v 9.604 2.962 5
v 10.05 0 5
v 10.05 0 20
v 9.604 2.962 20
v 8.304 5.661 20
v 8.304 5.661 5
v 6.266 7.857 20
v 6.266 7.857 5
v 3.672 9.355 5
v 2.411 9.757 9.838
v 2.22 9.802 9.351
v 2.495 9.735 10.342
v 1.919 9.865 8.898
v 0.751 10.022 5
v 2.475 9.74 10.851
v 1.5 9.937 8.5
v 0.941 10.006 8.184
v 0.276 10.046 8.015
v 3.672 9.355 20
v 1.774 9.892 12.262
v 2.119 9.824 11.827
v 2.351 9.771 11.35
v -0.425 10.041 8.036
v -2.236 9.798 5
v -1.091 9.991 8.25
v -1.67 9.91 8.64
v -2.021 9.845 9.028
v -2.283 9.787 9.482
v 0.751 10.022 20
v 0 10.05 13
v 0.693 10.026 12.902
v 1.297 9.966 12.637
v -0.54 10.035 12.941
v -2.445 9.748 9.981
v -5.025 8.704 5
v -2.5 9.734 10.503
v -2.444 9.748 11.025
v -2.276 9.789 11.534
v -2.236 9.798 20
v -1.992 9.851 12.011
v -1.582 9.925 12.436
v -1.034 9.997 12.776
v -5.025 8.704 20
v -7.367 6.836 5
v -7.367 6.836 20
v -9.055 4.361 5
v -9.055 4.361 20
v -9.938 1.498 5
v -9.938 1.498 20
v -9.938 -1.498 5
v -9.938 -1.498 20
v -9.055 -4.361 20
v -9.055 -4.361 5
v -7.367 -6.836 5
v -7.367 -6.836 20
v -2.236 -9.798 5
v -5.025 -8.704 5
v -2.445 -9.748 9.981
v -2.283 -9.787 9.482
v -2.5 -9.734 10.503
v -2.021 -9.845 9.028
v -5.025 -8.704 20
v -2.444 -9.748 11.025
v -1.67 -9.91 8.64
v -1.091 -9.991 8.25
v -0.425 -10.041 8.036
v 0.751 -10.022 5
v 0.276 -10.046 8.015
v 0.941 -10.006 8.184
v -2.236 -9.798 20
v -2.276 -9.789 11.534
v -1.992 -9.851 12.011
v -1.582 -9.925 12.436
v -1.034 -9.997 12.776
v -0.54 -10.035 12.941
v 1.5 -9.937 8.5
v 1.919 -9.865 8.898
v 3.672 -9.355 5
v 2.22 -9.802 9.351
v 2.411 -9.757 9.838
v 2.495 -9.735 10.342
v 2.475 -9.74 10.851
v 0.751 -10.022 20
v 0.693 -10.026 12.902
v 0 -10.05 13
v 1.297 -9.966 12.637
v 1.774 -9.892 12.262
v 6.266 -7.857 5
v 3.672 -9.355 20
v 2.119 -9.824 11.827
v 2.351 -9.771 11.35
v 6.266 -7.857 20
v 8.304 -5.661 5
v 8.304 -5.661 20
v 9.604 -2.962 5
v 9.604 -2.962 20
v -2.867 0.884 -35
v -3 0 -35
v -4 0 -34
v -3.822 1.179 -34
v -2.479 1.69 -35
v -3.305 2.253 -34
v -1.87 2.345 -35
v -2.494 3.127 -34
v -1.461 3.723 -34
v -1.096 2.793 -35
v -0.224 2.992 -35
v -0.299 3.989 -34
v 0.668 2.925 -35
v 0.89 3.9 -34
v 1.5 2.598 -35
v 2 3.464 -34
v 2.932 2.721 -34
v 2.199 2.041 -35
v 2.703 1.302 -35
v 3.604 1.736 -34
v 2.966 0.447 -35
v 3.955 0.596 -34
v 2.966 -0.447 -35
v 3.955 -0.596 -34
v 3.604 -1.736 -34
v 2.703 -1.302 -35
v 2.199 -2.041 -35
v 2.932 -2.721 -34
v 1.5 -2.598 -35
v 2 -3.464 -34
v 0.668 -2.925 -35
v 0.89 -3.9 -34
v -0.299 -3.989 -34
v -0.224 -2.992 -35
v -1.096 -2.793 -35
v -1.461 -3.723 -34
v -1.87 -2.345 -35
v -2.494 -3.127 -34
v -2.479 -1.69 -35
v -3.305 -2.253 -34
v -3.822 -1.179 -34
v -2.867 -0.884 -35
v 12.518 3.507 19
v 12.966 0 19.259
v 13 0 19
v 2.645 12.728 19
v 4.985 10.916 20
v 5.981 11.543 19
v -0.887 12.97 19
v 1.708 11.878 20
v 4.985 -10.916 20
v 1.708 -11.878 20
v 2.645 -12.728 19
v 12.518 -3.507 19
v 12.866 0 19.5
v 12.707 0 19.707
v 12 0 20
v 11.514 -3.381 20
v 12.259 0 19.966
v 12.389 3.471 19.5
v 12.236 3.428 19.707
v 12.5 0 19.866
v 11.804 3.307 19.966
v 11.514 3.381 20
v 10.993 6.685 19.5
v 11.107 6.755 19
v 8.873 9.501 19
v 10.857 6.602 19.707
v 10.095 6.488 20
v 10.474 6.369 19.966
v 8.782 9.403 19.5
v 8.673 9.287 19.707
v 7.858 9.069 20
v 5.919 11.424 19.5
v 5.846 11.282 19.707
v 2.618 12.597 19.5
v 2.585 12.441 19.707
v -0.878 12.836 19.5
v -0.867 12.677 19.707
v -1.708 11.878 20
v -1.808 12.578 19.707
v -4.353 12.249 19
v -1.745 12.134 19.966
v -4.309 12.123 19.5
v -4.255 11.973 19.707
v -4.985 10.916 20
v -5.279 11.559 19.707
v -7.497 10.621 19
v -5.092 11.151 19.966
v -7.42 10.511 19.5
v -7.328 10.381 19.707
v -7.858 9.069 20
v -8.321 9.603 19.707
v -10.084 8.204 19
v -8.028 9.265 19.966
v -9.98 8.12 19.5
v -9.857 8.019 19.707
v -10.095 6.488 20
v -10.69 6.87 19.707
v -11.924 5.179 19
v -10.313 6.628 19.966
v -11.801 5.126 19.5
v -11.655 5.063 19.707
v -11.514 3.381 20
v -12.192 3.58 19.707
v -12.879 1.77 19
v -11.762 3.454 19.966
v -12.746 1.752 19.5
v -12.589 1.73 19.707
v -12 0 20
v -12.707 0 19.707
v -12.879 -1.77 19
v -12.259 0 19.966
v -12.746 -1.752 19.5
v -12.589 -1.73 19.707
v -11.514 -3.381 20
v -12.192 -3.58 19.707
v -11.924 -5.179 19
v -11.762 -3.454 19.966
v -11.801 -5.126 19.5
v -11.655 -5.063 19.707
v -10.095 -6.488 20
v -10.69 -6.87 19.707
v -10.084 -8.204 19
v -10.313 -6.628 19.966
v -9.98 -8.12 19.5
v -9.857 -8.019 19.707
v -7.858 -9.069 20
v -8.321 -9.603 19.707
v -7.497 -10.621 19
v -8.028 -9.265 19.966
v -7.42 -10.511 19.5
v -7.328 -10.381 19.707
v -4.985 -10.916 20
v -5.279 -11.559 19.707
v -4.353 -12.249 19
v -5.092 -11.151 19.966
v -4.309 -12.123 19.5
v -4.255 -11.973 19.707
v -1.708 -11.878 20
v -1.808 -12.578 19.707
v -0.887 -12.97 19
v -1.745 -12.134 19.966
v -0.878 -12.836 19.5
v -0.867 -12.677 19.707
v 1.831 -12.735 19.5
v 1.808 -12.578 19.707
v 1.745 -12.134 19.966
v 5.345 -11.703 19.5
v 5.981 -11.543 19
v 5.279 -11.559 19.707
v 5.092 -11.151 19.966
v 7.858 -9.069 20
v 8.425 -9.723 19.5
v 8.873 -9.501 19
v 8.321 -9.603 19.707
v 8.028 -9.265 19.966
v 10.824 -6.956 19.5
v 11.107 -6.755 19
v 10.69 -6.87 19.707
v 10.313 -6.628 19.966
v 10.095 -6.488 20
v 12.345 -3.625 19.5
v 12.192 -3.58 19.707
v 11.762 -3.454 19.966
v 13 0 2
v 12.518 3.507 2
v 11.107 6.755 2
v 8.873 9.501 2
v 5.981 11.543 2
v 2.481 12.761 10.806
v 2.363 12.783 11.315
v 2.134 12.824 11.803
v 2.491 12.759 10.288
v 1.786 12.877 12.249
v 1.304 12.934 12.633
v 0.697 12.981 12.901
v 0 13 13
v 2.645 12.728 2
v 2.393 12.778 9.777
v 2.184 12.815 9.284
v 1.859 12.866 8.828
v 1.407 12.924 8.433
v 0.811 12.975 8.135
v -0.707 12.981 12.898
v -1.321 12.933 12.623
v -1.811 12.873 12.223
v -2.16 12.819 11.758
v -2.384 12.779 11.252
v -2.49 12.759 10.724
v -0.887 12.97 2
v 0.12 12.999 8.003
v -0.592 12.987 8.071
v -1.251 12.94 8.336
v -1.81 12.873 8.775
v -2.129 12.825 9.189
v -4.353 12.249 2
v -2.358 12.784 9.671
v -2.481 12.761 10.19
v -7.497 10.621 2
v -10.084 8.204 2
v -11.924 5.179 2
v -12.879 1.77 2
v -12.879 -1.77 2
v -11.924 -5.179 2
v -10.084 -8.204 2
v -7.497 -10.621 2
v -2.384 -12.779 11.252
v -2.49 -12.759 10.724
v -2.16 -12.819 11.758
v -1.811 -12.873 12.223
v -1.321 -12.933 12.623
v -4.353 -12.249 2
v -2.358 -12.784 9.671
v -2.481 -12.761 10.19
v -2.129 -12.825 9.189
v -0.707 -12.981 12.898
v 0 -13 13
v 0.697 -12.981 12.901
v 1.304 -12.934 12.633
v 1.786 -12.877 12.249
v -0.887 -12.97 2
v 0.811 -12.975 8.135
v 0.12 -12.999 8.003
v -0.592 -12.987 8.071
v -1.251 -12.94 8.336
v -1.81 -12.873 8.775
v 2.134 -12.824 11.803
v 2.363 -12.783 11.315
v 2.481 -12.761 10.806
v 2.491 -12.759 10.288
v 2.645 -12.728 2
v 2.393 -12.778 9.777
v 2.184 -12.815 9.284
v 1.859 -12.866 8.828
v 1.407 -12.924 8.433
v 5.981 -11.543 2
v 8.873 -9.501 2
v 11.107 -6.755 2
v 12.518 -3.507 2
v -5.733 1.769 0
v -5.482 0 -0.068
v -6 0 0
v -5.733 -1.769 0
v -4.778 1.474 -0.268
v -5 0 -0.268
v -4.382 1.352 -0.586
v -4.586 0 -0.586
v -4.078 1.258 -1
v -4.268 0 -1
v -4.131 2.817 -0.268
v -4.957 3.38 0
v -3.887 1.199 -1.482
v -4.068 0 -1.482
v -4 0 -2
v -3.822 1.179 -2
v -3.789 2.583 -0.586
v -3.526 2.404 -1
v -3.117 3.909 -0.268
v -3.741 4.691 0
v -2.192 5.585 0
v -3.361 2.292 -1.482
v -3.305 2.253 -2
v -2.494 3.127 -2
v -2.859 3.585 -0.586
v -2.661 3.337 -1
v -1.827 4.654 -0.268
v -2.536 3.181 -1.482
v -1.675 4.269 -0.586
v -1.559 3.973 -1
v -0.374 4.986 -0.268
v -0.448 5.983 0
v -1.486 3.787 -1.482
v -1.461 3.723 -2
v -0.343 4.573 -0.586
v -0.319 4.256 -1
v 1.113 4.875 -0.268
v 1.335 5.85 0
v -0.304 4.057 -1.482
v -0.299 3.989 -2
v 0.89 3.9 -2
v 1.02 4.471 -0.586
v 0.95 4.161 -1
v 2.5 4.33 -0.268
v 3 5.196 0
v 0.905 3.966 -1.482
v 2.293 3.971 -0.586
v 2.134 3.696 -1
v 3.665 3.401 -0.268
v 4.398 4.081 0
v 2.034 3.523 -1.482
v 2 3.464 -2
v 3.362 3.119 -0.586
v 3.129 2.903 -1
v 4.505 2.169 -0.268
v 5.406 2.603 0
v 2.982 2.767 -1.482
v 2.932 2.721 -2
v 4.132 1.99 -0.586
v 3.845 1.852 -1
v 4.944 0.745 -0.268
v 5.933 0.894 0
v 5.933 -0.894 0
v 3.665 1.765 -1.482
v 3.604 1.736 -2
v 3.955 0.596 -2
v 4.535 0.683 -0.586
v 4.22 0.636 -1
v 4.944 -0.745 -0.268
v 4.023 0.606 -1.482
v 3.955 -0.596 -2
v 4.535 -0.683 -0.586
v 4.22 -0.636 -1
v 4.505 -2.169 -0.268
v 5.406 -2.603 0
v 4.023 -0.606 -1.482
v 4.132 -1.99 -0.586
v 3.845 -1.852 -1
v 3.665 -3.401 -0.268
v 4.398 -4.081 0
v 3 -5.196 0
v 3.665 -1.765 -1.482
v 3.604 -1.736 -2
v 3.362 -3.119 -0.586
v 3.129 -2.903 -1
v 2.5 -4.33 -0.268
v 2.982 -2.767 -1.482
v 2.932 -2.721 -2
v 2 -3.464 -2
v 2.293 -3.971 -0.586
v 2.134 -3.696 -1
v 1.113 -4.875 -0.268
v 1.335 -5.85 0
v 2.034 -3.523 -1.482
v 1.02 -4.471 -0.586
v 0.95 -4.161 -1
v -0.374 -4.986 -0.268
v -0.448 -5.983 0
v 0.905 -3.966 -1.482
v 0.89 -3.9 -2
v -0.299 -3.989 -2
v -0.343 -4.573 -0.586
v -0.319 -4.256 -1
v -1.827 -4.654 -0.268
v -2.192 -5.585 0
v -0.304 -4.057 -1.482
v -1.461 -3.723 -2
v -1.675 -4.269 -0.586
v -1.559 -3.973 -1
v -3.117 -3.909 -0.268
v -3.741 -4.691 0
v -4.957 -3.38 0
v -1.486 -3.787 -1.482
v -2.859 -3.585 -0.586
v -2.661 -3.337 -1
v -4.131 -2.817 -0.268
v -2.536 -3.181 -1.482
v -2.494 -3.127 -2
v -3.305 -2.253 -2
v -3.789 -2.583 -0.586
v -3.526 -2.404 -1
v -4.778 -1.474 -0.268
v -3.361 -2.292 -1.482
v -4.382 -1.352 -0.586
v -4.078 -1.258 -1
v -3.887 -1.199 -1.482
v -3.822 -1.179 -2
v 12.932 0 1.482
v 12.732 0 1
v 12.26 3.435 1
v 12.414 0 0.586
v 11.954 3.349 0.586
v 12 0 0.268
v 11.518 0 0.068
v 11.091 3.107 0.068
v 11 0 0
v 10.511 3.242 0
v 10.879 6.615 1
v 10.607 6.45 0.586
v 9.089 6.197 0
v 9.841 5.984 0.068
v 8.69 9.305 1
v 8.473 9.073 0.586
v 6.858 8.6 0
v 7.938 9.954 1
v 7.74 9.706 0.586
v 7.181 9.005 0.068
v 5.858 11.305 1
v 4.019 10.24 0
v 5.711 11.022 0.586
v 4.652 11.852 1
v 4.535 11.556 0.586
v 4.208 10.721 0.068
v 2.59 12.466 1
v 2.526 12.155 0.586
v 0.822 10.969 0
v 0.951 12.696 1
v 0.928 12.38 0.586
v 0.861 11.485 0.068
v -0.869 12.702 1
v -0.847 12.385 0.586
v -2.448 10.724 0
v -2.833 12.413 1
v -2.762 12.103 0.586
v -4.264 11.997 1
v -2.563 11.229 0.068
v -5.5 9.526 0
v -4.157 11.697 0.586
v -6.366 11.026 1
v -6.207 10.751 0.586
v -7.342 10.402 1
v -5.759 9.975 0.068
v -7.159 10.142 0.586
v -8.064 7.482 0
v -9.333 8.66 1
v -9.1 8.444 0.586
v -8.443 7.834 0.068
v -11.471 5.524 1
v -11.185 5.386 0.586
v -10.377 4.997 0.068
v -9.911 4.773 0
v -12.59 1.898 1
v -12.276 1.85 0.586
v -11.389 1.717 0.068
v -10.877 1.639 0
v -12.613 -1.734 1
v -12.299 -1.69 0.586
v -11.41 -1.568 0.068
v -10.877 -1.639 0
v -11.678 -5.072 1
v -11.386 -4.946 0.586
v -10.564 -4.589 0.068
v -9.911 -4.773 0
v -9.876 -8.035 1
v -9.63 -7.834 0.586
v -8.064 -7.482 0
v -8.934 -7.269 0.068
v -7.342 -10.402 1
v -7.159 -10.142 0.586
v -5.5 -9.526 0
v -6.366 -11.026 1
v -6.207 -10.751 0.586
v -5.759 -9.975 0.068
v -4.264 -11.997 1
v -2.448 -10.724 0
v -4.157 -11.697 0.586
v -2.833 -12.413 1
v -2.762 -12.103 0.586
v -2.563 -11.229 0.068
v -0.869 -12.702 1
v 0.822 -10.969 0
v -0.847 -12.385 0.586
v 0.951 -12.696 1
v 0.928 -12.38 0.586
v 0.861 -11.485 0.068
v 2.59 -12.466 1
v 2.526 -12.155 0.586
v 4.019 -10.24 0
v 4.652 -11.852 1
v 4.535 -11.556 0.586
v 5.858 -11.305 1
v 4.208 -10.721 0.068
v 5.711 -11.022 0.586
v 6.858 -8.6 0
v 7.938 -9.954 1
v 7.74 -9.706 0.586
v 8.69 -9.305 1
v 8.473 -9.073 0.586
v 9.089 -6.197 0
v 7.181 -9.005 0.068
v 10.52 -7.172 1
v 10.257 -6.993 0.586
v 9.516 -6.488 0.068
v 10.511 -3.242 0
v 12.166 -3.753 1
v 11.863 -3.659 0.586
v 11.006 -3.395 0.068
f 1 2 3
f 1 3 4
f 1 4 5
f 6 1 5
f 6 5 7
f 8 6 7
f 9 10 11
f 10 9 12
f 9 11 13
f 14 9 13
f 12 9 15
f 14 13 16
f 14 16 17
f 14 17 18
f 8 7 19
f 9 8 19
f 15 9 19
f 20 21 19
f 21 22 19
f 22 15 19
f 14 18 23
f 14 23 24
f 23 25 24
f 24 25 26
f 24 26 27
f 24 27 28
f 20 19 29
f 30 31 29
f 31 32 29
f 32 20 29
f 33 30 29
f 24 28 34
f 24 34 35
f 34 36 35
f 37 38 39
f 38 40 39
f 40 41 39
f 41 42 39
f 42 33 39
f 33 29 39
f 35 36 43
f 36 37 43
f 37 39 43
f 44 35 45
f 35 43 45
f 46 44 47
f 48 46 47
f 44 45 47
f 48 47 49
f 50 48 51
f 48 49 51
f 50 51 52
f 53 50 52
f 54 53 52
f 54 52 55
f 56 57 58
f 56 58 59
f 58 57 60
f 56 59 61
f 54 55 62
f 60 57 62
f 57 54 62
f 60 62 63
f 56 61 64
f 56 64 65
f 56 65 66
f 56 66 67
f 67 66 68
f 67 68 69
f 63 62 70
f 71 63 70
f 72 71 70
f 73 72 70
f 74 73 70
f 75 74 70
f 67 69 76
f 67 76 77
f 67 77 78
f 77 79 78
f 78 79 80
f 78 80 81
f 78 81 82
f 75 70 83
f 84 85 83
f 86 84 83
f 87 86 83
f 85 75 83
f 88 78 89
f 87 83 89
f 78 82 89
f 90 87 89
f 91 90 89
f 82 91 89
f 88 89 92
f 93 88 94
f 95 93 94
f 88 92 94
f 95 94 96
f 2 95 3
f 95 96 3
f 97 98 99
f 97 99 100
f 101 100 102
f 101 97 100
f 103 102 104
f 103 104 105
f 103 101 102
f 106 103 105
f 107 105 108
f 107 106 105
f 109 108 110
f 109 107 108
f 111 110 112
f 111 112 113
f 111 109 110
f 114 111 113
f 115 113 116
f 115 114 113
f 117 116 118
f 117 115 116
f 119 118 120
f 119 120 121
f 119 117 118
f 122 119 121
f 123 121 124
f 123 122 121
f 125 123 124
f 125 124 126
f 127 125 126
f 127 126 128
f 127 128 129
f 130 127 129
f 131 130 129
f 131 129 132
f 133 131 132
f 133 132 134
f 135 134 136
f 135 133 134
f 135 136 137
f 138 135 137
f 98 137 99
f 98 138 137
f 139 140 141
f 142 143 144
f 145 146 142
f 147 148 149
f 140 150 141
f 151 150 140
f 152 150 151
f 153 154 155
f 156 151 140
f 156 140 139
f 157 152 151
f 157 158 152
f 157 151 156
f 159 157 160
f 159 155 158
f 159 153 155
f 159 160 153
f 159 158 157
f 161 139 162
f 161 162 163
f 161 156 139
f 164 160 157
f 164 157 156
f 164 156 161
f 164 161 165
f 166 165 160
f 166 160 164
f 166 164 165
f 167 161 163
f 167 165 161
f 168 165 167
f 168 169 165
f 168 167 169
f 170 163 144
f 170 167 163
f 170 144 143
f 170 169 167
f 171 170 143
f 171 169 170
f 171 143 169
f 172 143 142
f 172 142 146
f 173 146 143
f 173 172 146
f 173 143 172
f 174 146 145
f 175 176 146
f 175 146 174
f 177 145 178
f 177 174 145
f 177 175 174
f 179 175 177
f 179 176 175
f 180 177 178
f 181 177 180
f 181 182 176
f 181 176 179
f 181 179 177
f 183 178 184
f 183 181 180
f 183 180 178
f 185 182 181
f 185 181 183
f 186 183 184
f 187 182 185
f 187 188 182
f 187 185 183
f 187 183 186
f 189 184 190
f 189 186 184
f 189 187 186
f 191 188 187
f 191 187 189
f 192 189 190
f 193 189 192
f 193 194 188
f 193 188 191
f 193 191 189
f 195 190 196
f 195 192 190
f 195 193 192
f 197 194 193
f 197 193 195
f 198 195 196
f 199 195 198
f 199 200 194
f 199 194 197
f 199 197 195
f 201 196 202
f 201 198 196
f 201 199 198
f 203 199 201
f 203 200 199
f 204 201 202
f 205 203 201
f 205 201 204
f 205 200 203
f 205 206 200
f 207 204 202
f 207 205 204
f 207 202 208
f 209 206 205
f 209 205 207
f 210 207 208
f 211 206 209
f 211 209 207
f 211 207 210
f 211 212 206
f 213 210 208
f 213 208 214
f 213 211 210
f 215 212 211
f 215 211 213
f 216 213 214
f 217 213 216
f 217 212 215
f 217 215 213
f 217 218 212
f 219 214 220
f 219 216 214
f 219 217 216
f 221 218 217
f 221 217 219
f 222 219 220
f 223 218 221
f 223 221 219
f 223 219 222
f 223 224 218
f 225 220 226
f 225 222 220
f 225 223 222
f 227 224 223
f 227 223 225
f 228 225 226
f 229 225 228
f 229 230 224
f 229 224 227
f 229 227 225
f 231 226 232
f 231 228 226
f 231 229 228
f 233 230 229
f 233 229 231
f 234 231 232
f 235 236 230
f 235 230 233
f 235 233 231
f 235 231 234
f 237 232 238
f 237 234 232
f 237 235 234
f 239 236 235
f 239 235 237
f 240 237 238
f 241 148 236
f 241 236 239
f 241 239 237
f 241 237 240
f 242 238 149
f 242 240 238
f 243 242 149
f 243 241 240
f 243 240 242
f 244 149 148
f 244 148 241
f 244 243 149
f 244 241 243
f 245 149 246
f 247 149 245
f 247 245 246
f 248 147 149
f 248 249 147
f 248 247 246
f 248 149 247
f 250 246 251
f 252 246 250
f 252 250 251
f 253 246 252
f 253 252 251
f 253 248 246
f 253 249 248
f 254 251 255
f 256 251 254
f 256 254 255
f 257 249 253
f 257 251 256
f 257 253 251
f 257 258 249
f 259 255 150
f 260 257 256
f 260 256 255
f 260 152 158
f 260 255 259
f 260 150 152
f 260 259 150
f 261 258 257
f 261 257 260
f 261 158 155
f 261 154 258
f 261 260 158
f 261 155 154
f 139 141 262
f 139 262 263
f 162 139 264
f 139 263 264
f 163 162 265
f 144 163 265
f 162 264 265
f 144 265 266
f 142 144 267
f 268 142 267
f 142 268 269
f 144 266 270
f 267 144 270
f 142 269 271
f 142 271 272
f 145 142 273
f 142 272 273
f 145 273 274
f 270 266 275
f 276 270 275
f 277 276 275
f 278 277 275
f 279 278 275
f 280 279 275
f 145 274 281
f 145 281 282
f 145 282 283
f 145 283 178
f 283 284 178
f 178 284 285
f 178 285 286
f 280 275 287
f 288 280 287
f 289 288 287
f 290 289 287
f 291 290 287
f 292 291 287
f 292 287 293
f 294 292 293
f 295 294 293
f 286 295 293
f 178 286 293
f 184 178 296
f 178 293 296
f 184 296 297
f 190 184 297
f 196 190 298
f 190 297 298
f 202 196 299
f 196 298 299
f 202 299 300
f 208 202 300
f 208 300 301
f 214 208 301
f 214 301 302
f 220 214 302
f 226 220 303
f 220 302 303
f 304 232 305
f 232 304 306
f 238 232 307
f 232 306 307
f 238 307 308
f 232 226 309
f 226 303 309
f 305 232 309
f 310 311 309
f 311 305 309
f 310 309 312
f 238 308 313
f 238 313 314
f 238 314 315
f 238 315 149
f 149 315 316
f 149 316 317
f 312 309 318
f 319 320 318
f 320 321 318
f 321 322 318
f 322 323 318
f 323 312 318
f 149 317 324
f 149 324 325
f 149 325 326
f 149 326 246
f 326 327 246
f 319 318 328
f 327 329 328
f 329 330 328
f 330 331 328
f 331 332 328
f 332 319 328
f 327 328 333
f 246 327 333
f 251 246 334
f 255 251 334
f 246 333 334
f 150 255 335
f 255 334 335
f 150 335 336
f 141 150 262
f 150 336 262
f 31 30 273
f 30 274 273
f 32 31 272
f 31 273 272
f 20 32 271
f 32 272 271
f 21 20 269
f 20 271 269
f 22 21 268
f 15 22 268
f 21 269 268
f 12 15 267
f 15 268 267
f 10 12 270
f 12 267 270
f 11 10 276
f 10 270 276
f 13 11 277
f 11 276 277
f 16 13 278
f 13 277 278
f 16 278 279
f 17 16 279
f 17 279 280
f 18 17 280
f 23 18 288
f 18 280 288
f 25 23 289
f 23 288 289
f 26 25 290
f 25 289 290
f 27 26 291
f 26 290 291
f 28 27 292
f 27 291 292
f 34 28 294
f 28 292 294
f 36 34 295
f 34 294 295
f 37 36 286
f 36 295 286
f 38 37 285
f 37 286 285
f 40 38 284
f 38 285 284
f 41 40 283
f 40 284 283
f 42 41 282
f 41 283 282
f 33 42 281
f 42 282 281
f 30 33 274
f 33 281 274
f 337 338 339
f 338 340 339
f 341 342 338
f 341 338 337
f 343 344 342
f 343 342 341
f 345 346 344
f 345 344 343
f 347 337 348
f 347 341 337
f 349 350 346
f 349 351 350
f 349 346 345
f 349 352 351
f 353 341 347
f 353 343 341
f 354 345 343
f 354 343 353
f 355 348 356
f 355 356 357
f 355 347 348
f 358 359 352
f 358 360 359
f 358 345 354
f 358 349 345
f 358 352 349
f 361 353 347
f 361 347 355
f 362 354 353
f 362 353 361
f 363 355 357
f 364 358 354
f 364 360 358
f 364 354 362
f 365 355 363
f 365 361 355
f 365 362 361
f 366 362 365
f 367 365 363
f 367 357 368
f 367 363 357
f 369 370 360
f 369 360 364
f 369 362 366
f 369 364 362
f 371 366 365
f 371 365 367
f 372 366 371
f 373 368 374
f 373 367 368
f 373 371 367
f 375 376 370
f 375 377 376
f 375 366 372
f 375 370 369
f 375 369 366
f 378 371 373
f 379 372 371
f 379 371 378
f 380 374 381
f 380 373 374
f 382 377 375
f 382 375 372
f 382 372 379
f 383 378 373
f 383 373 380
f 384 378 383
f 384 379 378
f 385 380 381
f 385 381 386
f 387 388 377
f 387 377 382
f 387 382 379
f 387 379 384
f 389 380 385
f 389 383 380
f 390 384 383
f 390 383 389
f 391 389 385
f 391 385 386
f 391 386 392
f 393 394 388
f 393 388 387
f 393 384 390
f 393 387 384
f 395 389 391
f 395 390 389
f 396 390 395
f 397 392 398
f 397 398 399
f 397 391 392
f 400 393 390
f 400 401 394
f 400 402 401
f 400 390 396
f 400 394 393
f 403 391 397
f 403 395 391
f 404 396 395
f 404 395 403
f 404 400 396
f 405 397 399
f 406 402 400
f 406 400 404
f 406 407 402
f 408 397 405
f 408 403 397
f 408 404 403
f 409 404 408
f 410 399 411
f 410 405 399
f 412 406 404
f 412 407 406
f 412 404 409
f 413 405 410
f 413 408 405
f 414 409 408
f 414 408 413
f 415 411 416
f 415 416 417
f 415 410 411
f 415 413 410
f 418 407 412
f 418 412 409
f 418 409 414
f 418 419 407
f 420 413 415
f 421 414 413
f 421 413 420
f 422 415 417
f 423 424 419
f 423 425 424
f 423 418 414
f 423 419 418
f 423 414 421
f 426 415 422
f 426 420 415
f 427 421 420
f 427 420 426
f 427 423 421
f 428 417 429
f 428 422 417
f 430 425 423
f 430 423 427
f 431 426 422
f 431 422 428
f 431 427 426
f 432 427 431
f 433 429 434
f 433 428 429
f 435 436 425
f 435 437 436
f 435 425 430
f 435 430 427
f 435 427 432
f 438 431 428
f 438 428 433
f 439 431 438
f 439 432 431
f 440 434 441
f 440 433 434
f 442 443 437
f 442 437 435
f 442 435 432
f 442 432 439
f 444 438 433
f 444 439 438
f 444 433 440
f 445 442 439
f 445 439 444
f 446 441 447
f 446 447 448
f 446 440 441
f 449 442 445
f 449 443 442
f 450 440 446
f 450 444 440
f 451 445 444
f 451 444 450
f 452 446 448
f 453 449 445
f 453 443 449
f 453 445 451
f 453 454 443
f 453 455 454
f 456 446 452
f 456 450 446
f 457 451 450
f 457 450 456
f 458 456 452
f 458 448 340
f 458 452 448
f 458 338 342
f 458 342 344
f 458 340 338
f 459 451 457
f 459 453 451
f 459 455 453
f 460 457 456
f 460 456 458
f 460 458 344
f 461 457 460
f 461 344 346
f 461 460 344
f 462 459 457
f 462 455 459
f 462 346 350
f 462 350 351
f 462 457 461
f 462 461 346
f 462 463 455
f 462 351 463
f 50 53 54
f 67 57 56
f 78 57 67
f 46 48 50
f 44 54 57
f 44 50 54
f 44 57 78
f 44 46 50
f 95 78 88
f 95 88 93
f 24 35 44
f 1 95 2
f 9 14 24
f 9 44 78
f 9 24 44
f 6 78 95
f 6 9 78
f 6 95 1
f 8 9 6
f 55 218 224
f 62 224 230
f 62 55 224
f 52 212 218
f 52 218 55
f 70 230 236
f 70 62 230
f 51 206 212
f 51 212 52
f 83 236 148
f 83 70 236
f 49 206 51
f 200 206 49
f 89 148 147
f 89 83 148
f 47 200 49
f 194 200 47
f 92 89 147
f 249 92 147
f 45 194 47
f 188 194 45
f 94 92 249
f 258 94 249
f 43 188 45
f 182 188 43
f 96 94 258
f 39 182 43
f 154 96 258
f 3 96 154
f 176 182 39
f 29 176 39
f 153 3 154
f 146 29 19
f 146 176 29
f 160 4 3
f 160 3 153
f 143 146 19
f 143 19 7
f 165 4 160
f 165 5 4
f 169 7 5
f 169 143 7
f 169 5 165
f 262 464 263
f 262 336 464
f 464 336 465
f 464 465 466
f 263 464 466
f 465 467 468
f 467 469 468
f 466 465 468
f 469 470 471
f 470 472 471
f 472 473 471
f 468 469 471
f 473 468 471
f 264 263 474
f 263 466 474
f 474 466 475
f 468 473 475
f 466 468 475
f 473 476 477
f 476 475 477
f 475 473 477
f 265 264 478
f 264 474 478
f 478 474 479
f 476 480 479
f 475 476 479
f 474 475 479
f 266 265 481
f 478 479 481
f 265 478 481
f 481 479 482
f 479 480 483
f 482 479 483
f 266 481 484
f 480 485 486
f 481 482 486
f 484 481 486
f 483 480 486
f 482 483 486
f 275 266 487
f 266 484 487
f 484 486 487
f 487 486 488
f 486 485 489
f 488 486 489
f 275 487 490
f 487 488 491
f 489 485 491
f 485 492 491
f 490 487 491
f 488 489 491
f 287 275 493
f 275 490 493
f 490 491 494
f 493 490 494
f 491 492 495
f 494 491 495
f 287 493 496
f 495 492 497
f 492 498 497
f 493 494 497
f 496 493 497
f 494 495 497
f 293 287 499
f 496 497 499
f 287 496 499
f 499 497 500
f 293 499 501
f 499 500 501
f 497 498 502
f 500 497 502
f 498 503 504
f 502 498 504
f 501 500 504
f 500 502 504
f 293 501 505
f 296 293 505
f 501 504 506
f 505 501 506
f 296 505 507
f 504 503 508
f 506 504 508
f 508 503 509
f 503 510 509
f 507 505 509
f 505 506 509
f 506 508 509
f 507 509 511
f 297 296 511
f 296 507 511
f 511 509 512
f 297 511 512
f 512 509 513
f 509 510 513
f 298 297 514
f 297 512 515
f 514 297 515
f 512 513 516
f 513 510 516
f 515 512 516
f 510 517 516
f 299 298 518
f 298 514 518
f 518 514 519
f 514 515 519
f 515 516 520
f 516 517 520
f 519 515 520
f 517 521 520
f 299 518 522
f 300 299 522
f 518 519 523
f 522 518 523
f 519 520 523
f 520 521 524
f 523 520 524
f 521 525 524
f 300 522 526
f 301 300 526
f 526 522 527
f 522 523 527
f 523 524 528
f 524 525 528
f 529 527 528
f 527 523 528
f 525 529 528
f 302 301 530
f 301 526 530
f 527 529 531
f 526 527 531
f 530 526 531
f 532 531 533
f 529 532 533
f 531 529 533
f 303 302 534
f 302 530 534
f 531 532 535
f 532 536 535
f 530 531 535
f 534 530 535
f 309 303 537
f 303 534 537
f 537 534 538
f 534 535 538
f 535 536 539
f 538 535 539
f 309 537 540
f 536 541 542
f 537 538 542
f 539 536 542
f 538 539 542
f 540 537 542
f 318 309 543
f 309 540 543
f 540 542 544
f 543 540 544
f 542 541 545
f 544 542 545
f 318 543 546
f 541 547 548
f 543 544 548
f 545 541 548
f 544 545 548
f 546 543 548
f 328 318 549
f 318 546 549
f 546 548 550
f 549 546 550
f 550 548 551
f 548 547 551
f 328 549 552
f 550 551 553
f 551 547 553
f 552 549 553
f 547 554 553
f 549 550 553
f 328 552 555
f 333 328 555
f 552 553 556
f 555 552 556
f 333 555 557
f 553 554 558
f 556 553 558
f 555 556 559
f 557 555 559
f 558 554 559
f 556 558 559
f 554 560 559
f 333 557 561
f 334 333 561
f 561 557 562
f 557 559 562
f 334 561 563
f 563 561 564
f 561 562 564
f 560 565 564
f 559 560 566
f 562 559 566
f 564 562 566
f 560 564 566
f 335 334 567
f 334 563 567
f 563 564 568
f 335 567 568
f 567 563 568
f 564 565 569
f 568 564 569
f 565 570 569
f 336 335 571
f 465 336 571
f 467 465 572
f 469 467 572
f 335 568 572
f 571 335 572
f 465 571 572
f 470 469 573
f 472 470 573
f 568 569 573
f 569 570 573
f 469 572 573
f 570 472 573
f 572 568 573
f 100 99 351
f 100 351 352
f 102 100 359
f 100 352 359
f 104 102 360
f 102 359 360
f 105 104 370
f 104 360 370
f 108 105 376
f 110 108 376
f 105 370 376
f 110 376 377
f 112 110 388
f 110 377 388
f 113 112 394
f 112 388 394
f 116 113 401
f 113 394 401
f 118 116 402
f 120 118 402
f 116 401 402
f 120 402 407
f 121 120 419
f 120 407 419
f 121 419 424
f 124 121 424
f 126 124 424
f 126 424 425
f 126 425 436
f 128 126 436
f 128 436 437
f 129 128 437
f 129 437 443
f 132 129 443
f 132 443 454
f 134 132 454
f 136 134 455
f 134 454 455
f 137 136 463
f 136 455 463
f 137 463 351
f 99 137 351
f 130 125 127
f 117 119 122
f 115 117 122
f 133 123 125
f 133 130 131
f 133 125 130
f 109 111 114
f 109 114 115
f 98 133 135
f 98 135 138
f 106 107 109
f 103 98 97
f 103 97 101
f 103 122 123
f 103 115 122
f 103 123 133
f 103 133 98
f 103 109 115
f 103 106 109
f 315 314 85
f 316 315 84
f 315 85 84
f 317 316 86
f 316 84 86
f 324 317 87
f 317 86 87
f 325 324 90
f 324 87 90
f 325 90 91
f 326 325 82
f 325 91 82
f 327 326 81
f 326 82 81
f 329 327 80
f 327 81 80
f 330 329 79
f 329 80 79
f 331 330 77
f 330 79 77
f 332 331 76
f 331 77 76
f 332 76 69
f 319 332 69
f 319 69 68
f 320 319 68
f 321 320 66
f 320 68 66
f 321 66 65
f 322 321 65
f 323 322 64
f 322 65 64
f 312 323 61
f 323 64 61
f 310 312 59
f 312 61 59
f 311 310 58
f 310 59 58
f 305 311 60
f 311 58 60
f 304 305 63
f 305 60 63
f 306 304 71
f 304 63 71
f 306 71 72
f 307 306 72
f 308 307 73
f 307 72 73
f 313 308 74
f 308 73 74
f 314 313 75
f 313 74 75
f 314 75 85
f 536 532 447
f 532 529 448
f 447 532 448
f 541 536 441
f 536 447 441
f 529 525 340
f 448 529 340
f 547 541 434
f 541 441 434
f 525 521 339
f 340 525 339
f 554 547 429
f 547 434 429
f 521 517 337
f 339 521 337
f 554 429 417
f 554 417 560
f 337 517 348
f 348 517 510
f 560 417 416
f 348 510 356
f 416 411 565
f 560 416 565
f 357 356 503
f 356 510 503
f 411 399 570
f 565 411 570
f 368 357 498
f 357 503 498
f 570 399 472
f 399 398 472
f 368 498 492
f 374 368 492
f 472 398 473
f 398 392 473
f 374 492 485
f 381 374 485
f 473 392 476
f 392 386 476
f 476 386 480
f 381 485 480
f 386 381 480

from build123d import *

# Parameters (mm, degrees)
SKETCH1_R           = 13
BOSS_EXTRUDE1_DEPTH = 20
SKETCH2_R           = 10.05
CUT_EXTRUDE1_DEPTH  = 15
SKETCH3_R           = 4
BOSS_EXTRUDE2_DEPTH = 35
FILLET1_R           = 2
CHAMFER1_SIZE       = 1
FILLET2_R           = 1
SKETCH4_R           = 2.5
CUT_EXTRUDE2_DEPTH  = 20


with BuildPart() as part:
    # Sketch1 → Boss-Extrude1 (new body)
    with BuildSketch(Plane.XY):
        Circle(SKETCH1_R)
    extrude(amount=BOSS_EXTRUDE1_DEPTH)

    # Sketch2 → Cut-Extrude1 (cut)
    with BuildSketch(Plane.XY.offset(20)):
        Circle(SKETCH2_R)
    extrude(amount=-CUT_EXTRUDE1_DEPTH, mode=Mode.SUBTRACT)

    # Sketch3 → Boss-Extrude2 (add)
    with BuildSketch(Plane(origin=(0, 0, 0), x_dir=(-1, 0, 0), z_dir=(0, 0, -1))):
        Circle(SKETCH3_R)
    extrude(amount=BOSS_EXTRUDE2_DEPTH)

    # Fillet1
    fillet1_edges = [part.edges().sort_by_distance(p)[0] for p in [
        (-13, 0, 0),
        (4, 0, 0),
    ]]
    fillet(fillet1_edges, radius=FILLET1_R)

    # Chamfer1
    chamfer1_edges = [part.edges().sort_by_distance(p)[0] for p in [
        (4, 0, -35),
    ]]
    chamfer(chamfer1_edges, length=CHAMFER1_SIZE)

    # Fillet2
    fillet2_edges = [part.edges().sort_by_distance(p)[0] for p in [
        (-13, 0, 20),
    ]]
    fillet(fillet2_edges, radius=FILLET2_R)

    # Sketch4 → Cut-Extrude2 (cut, symmetric)
    with BuildSketch(Plane(origin=(0, 0, 0), x_dir=(1, 0, 0), z_dir=(0, 1, 0))):
        with Locations(Location((0, -10.5, 0), (0, 0, 270))):
            Circle(SKETCH4_R)
    extrude(amount=CUT_EXTRUDE2_DEPTH, both=True, mode=Mode.SUBTRACT)


solid = part.part
